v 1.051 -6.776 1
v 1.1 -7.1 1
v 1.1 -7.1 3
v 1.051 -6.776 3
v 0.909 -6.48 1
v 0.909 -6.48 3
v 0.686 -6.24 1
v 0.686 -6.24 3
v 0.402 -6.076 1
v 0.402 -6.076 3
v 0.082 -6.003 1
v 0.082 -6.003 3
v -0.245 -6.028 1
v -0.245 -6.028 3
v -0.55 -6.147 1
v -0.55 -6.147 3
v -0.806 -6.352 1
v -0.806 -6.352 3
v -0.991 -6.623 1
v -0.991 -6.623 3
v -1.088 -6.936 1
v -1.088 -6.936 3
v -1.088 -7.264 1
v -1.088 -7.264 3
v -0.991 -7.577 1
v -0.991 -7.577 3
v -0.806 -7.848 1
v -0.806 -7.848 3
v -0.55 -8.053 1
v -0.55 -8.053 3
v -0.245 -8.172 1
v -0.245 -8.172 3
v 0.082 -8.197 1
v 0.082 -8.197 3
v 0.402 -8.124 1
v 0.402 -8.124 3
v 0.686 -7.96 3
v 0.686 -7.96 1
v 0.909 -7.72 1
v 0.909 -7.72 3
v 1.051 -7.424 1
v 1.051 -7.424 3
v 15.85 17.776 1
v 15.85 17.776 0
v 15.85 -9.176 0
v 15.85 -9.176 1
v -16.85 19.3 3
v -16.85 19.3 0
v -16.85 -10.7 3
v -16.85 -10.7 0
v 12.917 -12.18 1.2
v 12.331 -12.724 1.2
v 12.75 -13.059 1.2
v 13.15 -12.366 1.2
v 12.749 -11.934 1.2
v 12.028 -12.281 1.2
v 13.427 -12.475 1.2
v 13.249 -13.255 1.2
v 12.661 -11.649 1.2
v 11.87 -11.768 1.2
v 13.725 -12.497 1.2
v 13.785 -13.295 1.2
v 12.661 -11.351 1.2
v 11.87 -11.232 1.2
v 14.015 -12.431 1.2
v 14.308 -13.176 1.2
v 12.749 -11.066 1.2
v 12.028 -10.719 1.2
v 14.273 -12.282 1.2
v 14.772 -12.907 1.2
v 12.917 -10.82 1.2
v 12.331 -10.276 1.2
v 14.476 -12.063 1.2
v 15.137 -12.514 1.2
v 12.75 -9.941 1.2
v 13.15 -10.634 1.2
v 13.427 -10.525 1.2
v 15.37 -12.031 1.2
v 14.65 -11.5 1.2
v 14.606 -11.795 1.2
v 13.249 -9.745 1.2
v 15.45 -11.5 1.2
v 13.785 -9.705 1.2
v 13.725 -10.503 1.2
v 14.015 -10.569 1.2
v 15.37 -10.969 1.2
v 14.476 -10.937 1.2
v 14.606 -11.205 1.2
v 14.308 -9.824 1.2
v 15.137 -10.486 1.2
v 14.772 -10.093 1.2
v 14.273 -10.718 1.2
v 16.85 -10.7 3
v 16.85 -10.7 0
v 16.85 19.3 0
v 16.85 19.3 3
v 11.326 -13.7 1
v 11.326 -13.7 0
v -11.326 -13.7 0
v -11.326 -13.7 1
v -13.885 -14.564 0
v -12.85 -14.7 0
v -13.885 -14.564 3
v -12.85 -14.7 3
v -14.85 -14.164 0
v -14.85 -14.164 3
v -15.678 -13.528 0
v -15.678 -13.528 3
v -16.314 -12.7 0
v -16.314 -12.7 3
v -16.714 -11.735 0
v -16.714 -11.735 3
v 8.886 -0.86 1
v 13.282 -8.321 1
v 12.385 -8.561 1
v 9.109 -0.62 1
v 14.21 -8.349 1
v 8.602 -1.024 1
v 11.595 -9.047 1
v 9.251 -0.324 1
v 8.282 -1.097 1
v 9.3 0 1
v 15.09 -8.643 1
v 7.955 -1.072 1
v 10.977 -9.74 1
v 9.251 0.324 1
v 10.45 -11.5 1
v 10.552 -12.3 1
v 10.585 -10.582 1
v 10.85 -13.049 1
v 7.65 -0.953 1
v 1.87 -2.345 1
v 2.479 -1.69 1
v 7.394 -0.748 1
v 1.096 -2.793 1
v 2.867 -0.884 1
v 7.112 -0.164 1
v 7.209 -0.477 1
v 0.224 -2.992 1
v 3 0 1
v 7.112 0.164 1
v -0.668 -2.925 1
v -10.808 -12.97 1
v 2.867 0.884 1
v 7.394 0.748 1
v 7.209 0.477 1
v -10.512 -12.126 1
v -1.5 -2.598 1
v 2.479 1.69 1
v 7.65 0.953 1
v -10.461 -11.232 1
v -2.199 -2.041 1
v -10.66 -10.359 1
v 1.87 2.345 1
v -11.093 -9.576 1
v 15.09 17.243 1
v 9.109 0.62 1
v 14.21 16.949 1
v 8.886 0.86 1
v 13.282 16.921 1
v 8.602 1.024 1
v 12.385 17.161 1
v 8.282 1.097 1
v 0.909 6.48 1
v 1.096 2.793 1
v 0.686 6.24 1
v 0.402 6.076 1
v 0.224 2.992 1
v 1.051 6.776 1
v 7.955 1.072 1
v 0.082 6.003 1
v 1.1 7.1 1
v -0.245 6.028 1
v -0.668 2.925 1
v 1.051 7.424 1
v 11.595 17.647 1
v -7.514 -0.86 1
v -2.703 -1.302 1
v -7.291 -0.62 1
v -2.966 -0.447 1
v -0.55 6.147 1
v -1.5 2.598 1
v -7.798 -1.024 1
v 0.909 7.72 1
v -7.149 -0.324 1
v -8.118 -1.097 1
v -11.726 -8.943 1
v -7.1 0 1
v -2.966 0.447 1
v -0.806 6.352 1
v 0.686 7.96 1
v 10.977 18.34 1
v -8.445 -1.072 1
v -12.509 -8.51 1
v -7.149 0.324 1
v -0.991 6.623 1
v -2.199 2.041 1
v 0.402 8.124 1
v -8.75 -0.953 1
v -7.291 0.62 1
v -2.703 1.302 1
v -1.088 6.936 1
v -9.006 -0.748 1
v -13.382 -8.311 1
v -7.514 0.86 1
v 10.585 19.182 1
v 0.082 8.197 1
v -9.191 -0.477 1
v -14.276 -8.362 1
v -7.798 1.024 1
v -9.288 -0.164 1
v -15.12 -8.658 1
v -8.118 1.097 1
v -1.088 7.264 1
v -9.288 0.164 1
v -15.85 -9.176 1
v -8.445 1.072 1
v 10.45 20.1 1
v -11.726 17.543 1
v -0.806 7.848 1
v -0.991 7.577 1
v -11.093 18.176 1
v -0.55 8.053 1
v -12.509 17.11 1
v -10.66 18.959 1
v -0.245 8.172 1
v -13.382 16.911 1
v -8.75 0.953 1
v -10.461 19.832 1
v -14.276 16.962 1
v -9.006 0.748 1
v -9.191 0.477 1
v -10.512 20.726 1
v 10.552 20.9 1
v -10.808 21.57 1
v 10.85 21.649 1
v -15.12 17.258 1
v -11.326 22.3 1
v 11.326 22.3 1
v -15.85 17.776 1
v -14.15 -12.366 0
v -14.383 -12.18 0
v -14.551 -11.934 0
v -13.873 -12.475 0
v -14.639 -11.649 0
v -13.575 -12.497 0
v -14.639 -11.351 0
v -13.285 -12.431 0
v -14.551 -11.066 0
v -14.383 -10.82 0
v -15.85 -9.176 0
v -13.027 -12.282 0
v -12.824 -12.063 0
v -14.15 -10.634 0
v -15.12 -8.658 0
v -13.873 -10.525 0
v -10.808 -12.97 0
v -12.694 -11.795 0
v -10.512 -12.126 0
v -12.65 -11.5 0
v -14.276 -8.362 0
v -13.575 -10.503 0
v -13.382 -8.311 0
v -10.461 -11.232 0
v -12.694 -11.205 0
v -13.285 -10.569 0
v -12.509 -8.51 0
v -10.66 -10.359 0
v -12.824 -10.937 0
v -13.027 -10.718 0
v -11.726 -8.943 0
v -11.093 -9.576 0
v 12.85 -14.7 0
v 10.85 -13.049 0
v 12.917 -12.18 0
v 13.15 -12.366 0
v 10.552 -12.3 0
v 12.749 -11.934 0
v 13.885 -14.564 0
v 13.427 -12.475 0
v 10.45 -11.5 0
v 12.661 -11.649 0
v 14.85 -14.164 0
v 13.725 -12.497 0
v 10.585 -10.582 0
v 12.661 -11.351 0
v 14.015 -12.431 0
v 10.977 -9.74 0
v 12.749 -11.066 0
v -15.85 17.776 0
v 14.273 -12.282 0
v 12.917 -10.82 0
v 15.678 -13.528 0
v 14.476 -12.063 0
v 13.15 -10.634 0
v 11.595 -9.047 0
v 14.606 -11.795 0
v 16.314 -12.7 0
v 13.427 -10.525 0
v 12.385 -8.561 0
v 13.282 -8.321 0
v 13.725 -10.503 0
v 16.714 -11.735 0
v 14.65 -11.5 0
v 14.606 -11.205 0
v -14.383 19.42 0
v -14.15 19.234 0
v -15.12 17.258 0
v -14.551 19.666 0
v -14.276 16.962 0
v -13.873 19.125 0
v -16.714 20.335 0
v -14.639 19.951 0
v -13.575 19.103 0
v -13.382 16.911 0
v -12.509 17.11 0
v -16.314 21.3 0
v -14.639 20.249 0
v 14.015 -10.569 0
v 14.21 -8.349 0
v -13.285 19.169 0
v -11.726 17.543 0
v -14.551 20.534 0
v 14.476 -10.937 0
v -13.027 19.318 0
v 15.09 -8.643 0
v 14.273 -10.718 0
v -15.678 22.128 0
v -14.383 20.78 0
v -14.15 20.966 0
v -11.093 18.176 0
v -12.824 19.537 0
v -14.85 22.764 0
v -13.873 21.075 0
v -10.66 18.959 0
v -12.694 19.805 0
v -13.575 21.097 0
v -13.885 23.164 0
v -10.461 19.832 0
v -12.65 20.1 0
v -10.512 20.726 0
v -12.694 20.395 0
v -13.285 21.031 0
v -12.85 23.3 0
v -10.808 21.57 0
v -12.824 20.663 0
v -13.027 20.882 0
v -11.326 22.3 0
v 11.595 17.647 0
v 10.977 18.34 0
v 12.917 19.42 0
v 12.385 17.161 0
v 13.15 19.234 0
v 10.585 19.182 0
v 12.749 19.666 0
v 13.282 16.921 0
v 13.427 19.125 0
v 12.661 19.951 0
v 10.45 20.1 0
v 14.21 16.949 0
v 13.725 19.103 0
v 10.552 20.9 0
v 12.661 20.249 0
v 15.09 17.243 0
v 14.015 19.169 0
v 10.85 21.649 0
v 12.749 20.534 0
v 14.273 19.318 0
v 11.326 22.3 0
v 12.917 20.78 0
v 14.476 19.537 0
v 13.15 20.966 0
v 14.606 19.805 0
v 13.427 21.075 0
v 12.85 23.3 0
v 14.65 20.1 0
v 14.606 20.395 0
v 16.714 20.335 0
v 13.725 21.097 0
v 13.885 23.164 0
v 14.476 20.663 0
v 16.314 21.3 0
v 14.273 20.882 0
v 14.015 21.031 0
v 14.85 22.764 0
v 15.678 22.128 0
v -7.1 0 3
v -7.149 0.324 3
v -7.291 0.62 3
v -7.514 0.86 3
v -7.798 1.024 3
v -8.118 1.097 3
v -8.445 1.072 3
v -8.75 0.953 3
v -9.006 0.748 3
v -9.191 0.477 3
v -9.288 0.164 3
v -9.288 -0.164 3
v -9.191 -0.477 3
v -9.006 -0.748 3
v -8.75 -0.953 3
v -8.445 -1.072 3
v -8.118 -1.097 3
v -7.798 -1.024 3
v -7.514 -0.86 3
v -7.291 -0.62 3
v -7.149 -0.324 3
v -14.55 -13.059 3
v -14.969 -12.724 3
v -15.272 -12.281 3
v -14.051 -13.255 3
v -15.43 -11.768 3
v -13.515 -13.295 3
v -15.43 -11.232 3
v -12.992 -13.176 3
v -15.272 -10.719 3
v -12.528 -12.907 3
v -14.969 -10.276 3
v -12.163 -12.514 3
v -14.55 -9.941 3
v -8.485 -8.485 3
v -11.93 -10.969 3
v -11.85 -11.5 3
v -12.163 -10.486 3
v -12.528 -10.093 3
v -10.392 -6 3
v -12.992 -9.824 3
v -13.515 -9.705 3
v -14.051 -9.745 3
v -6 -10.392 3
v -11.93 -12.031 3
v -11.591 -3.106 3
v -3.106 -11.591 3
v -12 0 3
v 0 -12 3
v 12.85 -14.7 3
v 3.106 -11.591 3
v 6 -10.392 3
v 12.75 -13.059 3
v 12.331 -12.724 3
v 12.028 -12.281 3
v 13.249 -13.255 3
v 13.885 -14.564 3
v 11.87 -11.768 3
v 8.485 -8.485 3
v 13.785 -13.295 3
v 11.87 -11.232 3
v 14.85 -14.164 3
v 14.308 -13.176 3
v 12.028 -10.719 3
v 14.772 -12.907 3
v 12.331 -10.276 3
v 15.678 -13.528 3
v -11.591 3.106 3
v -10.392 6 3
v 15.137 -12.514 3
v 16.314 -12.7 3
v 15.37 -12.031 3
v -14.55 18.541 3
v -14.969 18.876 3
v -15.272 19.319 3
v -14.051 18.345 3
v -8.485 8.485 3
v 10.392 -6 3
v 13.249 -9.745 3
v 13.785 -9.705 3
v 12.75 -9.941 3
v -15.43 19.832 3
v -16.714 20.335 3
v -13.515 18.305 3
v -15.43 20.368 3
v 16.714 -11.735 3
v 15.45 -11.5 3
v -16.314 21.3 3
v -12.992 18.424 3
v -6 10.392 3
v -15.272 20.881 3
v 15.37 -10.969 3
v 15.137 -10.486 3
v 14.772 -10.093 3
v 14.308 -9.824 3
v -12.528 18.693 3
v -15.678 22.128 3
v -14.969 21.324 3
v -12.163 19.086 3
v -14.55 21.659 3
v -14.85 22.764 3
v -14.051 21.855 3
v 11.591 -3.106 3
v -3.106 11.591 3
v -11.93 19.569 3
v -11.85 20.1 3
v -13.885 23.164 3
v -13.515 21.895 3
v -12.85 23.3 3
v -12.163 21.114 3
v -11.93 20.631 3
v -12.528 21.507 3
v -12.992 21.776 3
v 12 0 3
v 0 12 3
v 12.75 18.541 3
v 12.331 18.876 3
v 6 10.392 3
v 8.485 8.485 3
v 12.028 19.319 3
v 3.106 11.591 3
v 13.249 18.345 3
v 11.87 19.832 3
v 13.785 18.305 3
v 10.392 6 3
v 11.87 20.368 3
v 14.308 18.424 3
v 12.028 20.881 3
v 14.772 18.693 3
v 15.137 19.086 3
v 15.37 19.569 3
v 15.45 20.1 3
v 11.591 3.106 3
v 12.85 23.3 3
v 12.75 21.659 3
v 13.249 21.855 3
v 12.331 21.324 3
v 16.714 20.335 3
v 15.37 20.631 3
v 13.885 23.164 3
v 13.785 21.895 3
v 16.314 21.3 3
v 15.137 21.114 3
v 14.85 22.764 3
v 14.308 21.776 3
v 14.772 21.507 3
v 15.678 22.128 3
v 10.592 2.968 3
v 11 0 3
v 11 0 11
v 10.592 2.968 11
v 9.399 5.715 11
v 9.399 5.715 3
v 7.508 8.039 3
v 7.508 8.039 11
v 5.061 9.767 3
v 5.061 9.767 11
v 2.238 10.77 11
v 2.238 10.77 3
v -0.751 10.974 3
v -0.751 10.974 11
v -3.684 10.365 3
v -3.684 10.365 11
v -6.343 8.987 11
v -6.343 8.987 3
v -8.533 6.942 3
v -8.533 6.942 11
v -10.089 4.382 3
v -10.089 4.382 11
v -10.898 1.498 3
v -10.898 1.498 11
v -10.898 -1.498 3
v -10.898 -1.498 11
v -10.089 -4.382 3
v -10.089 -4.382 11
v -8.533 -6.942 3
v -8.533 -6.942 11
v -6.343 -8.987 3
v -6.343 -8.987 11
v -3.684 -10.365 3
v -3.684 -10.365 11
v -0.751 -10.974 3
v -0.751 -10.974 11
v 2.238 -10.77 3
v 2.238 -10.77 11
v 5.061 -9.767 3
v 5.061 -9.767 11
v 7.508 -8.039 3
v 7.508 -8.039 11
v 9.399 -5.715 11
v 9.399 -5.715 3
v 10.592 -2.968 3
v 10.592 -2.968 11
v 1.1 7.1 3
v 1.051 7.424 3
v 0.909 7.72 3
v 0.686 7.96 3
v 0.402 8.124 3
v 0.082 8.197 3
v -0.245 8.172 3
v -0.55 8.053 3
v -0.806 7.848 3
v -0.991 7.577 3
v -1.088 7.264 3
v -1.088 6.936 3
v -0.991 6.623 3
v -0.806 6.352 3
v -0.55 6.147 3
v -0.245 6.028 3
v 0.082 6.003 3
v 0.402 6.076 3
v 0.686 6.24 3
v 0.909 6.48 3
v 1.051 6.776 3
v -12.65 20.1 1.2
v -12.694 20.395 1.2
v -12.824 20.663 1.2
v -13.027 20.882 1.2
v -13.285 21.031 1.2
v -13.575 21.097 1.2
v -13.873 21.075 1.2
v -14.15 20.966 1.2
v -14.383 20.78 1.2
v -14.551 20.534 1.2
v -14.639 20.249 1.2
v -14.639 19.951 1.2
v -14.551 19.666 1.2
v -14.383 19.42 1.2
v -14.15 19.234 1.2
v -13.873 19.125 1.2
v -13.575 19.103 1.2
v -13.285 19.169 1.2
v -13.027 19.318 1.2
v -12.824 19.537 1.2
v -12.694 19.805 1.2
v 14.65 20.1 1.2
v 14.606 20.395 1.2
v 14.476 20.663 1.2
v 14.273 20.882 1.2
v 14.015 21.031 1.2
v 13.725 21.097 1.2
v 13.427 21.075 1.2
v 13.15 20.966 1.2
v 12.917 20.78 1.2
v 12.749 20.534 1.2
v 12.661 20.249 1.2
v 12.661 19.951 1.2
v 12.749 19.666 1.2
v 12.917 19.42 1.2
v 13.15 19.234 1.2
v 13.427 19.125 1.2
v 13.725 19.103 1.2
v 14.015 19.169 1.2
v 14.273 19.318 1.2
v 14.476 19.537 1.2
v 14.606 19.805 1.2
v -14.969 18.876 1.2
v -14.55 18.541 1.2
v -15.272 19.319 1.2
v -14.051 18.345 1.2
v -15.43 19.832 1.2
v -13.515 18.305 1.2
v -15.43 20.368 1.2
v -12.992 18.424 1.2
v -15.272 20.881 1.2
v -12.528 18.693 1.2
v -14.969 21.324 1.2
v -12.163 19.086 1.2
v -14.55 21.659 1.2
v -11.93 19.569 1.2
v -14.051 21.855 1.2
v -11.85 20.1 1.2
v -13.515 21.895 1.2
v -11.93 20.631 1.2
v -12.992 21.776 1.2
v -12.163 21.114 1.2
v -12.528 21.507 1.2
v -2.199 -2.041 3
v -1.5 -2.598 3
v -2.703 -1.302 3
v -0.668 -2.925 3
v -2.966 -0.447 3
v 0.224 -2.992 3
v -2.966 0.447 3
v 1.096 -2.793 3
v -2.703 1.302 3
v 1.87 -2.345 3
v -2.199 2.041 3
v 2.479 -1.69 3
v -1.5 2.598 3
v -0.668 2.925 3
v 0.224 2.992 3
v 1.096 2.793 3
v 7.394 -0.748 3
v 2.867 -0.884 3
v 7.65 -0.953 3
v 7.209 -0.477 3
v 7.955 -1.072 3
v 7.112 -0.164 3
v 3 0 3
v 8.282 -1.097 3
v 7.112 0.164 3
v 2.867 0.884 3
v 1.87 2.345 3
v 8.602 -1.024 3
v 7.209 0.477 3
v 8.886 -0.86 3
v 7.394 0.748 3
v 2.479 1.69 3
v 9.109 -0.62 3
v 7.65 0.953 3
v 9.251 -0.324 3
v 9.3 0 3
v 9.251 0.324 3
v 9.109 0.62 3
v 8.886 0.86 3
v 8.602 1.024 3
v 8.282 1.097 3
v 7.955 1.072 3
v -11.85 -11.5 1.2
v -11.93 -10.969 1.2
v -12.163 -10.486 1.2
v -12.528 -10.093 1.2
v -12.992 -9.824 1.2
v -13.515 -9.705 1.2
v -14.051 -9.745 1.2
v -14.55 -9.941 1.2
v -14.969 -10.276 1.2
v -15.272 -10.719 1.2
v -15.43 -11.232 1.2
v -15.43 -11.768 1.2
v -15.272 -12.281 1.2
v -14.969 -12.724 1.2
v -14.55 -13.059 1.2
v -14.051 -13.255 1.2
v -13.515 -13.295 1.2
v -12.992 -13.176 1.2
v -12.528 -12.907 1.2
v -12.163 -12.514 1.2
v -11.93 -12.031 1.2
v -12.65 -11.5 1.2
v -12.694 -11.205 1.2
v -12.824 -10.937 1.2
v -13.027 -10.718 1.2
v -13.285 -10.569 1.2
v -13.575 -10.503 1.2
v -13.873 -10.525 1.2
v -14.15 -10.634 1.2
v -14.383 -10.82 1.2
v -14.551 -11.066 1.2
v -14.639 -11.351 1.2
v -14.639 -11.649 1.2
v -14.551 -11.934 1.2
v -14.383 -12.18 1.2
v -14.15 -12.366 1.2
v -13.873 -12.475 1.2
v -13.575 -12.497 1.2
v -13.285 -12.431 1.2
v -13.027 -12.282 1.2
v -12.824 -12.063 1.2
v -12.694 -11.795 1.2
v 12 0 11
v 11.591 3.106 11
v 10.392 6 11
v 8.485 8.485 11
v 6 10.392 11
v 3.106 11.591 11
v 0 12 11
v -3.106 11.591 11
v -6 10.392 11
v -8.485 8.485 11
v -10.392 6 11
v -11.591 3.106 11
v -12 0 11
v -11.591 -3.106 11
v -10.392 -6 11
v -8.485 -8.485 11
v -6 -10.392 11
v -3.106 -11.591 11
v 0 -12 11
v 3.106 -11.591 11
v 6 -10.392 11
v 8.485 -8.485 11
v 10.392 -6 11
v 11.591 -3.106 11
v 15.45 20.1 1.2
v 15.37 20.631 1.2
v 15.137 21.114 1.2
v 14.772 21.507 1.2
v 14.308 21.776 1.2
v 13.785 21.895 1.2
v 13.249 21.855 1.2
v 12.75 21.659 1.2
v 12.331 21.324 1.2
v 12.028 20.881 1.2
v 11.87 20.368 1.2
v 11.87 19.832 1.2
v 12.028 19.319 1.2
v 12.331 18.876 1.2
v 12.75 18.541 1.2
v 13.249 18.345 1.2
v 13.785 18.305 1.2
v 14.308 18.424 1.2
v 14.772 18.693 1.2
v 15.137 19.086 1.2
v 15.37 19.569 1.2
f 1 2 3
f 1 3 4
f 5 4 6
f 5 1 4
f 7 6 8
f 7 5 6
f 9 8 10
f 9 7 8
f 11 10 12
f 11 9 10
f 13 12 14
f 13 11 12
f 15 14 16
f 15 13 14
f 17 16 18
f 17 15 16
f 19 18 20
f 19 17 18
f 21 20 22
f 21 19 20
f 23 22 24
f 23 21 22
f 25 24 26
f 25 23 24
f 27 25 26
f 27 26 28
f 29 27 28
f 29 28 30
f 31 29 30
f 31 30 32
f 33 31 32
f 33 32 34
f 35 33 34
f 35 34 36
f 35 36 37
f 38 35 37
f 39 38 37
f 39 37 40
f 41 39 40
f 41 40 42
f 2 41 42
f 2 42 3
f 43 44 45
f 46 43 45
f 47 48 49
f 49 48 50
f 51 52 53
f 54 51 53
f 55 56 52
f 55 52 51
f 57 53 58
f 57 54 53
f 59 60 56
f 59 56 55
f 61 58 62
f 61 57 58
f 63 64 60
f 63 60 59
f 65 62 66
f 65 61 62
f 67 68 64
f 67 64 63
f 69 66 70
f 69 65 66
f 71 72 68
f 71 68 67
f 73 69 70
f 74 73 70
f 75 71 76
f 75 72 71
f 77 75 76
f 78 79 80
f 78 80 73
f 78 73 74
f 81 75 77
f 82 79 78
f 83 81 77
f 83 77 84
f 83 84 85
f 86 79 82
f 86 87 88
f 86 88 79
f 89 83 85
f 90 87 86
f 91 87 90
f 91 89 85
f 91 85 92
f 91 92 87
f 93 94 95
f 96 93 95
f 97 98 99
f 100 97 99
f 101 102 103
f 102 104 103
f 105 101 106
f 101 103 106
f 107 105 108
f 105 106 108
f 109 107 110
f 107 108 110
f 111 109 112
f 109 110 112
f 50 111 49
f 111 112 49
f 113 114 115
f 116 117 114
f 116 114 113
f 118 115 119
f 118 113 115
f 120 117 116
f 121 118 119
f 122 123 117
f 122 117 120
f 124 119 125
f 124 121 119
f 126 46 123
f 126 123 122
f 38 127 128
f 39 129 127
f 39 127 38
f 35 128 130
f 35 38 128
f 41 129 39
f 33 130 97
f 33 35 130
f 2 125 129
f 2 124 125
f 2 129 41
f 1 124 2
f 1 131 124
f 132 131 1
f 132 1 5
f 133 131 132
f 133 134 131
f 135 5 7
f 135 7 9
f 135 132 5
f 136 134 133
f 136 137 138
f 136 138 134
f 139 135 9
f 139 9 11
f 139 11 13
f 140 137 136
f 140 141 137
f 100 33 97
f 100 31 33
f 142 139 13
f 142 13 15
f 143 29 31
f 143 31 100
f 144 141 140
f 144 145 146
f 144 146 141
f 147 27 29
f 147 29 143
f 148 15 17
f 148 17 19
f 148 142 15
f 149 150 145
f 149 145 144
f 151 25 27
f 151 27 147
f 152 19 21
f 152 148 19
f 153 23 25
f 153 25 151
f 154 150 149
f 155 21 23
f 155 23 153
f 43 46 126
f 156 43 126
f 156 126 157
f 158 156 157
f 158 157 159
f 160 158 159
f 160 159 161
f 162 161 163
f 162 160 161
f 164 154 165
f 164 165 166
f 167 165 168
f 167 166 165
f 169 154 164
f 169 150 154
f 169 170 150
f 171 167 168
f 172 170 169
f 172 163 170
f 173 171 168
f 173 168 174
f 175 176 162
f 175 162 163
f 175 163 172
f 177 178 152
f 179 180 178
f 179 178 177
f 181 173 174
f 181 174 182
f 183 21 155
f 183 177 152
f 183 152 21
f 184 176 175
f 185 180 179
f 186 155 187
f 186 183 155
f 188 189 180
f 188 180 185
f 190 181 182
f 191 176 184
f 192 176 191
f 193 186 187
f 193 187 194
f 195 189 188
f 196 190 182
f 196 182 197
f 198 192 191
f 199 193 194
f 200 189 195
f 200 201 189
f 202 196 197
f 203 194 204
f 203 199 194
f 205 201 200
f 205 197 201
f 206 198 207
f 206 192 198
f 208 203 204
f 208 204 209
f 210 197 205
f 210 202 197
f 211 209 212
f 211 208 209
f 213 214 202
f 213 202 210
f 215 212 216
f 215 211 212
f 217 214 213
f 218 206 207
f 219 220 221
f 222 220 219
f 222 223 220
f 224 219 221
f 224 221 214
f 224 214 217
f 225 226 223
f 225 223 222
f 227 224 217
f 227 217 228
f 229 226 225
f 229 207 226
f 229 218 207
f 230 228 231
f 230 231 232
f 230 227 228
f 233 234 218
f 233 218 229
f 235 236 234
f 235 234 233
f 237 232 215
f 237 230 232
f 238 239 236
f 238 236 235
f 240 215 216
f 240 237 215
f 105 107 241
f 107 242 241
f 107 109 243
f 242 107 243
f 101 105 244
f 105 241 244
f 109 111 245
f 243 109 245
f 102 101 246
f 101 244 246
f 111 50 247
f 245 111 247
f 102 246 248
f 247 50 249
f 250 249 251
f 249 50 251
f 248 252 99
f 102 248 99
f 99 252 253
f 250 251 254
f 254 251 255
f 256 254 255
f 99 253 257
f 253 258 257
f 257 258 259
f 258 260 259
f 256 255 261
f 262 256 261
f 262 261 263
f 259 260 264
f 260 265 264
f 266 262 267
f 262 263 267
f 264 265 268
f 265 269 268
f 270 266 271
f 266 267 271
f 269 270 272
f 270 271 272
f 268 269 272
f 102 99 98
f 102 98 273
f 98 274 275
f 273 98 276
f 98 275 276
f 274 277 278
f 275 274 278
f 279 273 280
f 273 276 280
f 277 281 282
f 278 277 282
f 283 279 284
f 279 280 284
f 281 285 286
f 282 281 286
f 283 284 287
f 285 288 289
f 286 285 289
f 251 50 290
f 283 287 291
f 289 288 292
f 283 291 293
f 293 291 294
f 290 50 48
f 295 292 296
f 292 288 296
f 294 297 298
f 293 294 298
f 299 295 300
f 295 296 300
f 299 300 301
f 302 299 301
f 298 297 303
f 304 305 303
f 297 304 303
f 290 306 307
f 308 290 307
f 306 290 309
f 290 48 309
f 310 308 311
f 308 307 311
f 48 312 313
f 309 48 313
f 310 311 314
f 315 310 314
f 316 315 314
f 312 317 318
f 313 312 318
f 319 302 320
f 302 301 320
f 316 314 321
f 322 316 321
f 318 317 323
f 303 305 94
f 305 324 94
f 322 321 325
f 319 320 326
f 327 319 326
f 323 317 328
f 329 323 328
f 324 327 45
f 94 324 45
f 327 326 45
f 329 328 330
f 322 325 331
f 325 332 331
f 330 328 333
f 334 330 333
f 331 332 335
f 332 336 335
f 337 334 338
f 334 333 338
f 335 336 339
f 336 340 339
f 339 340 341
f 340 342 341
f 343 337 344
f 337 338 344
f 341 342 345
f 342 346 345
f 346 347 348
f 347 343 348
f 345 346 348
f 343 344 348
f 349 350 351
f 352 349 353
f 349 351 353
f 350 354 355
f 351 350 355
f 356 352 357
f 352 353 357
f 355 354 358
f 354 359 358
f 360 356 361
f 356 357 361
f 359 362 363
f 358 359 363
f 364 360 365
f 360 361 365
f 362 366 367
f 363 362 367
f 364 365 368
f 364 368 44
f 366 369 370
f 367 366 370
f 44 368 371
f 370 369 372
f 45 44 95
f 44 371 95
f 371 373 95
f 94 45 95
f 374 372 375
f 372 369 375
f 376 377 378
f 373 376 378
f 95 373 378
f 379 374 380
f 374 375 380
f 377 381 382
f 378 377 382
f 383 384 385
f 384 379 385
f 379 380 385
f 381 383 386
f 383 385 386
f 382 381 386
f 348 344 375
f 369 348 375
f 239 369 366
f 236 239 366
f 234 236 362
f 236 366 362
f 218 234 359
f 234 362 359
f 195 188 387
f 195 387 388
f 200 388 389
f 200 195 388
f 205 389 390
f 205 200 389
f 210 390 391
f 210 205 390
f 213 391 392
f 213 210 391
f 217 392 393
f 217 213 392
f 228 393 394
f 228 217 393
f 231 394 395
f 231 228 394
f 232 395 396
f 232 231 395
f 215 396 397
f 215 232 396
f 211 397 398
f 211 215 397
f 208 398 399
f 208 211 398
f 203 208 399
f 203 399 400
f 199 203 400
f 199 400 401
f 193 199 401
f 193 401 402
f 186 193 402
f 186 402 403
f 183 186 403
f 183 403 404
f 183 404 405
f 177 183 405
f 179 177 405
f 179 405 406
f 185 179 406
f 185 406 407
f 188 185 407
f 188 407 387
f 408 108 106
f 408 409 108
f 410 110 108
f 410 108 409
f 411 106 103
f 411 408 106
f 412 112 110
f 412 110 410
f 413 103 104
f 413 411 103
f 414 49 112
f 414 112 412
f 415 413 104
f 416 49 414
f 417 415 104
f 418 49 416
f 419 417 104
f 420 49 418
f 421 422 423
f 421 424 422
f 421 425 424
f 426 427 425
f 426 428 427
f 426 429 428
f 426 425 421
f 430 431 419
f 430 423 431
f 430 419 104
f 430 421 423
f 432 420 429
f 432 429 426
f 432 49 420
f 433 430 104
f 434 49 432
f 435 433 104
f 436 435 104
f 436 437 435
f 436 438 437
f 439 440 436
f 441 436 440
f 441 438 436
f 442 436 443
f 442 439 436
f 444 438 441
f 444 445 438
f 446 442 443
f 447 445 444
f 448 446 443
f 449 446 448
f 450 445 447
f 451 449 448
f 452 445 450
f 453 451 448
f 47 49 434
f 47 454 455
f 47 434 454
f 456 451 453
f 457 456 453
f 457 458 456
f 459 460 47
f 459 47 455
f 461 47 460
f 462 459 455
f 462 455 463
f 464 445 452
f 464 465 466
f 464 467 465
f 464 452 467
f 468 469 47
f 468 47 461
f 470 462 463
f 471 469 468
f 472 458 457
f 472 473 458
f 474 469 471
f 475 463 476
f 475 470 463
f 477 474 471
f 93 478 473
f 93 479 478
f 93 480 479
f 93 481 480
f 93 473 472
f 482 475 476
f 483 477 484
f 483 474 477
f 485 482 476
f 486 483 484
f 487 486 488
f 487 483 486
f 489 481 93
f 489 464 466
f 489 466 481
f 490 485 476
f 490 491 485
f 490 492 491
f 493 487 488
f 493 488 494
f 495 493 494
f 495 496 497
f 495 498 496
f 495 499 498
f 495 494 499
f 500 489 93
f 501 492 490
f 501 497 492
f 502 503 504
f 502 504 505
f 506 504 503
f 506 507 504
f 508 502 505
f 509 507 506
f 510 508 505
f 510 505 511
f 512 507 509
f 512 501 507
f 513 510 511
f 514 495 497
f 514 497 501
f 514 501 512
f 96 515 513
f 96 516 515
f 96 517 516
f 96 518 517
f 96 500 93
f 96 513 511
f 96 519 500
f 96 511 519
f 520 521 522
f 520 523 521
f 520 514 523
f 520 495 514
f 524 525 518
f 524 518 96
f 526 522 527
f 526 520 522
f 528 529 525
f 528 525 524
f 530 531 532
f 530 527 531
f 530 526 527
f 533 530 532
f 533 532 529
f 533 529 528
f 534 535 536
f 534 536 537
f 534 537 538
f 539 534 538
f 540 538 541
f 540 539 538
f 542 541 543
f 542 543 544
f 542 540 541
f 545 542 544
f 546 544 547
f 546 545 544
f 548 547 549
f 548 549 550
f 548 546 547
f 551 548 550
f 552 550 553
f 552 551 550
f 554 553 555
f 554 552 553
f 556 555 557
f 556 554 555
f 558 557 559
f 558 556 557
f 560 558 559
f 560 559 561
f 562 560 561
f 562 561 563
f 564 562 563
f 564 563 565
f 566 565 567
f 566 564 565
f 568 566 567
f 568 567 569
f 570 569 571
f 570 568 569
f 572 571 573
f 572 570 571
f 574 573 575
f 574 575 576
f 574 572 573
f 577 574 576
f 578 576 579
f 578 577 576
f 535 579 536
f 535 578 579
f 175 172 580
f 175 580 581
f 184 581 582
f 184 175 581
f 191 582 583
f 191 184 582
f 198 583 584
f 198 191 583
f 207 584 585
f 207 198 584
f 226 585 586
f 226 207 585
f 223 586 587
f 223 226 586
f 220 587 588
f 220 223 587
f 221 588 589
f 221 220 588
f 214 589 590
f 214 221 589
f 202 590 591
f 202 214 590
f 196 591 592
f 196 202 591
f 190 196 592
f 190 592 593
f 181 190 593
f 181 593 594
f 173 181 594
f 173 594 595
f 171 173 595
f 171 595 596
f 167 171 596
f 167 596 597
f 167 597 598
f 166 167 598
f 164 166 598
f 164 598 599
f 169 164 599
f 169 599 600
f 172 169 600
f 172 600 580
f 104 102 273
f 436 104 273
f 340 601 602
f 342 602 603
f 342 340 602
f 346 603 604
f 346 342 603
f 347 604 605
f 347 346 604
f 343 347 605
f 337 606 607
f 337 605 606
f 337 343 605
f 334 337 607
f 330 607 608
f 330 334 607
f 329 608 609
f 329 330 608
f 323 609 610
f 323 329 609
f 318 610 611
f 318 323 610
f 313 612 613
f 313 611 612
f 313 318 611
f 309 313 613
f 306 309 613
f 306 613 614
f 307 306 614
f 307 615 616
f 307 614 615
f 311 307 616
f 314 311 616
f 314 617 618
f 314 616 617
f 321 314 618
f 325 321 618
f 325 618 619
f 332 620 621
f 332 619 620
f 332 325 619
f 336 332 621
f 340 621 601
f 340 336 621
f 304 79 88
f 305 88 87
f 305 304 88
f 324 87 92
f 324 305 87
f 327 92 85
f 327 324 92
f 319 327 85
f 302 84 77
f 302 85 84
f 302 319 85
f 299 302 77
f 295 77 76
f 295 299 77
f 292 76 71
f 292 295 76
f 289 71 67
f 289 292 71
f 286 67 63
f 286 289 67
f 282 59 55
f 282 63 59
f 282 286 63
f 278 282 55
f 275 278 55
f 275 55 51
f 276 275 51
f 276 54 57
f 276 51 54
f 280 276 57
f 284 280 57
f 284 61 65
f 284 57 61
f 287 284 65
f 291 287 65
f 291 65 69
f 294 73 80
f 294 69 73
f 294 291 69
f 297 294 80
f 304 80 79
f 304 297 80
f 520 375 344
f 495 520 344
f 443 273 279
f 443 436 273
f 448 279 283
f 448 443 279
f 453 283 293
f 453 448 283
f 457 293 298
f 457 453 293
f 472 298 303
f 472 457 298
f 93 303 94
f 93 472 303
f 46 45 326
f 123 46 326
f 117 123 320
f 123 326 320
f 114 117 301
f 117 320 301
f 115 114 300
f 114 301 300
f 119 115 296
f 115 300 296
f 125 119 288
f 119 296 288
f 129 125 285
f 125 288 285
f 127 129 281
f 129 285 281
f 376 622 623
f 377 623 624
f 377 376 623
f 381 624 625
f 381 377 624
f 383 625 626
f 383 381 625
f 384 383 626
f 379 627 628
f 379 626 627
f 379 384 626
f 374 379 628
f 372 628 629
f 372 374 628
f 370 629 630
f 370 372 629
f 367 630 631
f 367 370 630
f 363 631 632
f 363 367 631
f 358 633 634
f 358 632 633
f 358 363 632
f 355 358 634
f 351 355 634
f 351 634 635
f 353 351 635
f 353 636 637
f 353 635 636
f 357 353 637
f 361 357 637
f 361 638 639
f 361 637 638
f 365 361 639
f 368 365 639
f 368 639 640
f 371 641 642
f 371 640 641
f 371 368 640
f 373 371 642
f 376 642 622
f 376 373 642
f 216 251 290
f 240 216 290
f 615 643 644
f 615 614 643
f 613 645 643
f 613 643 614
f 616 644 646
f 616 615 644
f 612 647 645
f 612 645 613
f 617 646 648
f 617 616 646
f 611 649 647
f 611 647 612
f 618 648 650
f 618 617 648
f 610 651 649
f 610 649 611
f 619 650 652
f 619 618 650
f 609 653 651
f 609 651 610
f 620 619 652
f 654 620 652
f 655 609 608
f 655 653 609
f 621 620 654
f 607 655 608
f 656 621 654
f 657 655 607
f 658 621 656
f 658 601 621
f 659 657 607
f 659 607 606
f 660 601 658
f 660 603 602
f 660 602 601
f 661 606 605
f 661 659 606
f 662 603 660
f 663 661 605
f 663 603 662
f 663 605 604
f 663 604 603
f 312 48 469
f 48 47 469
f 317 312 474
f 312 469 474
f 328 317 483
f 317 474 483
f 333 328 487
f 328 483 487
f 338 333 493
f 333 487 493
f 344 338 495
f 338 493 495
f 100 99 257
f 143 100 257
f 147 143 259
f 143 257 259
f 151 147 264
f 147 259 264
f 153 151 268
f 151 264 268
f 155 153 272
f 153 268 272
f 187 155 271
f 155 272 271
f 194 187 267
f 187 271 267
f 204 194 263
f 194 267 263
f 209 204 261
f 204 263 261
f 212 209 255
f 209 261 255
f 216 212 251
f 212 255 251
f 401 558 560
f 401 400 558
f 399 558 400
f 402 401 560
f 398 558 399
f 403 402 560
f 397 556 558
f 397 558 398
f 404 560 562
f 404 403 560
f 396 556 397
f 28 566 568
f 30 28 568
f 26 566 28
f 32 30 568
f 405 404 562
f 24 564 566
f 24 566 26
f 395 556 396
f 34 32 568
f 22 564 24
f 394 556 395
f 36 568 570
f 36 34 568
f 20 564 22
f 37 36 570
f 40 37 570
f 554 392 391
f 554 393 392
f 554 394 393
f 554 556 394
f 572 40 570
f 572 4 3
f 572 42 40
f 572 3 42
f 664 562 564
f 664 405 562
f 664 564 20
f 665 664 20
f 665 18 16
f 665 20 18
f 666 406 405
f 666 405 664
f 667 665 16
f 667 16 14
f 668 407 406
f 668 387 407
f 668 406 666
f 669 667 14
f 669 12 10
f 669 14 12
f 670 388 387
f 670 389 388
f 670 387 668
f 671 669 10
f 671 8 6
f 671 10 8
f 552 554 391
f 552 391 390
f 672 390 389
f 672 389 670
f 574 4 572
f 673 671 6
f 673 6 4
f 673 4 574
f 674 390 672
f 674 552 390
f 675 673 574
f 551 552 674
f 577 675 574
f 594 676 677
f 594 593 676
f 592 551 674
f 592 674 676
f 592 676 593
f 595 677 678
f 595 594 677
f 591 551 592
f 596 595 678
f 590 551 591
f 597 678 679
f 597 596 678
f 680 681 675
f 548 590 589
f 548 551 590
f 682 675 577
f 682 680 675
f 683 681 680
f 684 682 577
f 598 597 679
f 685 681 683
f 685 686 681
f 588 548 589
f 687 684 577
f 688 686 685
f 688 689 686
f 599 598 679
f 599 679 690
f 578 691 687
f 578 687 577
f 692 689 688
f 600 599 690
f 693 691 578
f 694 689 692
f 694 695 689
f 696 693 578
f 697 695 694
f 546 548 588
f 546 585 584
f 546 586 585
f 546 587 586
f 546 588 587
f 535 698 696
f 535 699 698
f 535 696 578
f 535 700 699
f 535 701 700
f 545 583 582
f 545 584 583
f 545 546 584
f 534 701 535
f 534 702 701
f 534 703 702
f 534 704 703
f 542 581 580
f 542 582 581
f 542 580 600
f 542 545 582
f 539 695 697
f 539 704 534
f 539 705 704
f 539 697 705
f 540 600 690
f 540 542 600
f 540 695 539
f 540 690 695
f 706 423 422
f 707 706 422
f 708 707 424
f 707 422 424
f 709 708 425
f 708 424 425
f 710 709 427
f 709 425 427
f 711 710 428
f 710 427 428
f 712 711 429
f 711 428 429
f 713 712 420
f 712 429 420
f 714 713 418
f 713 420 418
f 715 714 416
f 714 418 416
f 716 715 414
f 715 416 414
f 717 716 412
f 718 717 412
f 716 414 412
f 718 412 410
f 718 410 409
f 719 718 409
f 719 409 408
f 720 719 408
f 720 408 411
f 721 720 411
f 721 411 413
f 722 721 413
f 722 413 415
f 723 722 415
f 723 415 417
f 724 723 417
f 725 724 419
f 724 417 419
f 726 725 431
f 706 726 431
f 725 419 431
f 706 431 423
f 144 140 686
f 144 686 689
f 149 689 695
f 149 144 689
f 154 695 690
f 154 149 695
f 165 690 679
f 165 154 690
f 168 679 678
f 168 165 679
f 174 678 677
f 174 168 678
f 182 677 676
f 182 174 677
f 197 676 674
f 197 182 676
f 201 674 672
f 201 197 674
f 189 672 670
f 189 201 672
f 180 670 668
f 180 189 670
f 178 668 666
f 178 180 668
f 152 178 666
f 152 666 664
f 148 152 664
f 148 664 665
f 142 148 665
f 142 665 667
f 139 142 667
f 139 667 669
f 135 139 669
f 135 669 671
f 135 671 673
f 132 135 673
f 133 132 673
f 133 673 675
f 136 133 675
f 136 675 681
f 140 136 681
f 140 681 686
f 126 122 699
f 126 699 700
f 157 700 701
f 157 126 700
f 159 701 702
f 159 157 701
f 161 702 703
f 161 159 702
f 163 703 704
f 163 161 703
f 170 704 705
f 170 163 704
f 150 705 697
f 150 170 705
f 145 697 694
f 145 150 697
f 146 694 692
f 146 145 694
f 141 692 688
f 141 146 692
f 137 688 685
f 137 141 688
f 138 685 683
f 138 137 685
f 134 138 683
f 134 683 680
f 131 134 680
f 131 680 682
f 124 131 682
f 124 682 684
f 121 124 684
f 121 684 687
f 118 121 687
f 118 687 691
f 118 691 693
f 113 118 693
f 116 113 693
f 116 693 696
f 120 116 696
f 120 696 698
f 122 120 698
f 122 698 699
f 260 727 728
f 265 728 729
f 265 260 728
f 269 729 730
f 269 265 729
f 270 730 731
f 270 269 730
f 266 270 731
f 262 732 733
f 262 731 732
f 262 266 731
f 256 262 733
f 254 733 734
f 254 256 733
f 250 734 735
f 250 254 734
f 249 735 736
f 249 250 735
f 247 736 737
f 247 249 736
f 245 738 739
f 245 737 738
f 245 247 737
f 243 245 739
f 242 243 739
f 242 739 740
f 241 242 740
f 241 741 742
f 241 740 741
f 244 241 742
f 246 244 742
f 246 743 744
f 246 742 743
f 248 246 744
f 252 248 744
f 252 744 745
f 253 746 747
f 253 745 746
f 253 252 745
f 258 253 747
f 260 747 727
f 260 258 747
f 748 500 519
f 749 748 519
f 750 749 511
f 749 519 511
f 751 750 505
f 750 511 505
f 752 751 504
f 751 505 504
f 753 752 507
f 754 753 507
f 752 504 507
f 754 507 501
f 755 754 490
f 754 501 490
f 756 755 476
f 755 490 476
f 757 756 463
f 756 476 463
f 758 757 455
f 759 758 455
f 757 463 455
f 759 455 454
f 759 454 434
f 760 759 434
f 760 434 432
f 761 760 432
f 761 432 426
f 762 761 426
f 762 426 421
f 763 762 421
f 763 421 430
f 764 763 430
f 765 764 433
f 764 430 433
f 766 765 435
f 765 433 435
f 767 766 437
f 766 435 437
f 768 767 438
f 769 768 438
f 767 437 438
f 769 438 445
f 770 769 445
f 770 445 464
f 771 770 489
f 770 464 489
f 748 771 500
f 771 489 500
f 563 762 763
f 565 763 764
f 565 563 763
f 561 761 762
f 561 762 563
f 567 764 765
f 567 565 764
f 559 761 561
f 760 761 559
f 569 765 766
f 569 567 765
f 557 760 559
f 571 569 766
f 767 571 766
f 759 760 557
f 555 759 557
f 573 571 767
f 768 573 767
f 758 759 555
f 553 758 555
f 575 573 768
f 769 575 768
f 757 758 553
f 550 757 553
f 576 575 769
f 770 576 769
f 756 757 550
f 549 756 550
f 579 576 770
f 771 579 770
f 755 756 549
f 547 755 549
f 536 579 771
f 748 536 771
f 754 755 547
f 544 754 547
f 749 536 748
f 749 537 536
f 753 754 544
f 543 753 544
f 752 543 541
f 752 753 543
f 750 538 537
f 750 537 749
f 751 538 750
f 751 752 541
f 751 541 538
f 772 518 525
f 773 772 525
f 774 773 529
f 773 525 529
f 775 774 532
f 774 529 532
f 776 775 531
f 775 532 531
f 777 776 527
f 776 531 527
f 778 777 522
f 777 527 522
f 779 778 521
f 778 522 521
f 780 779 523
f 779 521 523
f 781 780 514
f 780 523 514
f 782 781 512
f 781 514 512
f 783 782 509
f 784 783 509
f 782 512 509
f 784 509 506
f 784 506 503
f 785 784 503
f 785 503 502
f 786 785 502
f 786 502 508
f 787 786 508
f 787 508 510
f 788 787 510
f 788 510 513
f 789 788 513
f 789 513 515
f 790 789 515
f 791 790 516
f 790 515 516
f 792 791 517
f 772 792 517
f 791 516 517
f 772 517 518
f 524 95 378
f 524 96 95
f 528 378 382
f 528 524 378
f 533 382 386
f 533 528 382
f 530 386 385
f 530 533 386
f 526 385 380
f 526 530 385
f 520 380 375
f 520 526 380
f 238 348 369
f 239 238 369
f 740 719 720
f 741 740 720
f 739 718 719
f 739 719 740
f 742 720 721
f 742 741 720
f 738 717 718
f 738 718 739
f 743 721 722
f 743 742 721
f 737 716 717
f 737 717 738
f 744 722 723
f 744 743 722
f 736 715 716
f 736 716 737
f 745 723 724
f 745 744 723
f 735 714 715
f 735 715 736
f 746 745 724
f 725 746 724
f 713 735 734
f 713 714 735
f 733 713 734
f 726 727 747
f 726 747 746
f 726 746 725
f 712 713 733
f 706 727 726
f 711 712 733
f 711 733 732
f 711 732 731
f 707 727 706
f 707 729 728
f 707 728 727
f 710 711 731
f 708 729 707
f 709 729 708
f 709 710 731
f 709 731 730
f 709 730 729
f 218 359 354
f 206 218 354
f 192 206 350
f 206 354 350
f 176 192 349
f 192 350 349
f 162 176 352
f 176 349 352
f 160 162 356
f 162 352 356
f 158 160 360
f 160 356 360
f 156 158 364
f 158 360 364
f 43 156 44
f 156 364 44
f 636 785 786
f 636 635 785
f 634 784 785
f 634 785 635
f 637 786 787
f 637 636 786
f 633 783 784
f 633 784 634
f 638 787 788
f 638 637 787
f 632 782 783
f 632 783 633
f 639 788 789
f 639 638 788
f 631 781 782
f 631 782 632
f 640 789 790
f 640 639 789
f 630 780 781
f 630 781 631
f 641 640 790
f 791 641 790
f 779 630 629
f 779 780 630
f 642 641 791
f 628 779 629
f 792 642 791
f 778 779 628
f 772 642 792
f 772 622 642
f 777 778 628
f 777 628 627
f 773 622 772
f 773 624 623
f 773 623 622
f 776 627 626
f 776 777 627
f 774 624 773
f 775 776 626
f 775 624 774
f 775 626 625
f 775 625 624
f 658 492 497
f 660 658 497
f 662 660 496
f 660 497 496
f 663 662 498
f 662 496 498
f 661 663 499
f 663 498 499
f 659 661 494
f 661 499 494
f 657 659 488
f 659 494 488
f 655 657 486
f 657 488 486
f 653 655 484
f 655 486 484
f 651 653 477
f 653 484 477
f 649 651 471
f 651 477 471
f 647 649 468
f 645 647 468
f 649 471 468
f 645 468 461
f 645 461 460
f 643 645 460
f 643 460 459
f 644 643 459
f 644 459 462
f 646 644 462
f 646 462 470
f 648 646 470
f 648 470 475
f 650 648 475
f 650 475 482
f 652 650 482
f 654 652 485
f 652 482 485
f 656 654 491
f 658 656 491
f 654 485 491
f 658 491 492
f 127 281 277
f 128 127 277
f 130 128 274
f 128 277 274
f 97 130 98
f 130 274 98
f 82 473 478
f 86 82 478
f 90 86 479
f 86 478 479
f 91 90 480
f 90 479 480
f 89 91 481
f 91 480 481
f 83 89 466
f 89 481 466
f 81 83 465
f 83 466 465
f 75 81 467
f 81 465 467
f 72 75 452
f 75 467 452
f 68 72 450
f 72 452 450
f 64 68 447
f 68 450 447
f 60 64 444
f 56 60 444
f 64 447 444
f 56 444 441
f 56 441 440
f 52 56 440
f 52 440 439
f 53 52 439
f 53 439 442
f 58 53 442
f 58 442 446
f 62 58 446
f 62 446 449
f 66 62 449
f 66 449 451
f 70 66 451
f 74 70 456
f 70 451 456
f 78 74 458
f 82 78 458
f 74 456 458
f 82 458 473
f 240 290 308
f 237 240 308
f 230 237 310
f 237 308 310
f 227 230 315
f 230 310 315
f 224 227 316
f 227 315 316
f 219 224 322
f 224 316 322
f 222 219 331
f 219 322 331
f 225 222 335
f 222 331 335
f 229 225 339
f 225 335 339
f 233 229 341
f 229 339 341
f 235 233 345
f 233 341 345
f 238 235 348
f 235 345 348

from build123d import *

# Parameters (mm, degrees)
SZKIC1_R                    = 3
SZKIC1_R_2                  = 1.1
SZKIC1_R_3                  = 1
DODANIE_WYCI_GNI_CIE1_DEPTH = 3
SZKIC2_R                    = 12
SZKIC2_R_2                  = 11
DODANIE_WYCI_GNI_CIE2_DEPTH = 8
SZKIC3_R                    = 1.1
SZKIC3_R_2                  = 3
WYTNIJ_WYCI_GNI_CIE1_DEPTH  = 1
SZKIC4_R                    = 1.8
WYTNIJ_WYCI_GNI_CIE2_DEPTH  = 1.8
ZAOKR_GLENIE1_R             = 4


with BuildPart() as part:
    # Szkic1 → Dodanie-wyciągnięcie1 (new body)
    with BuildSketch(Plane.XY):
        Polygon((-16.85, 0), (-16.85, -14.7), (0, -14.7), (16.85, -14.7), (16.85, 23.3), (-16.85, 23.3), align=None)
        Circle(SZKIC1_R, mode=Mode.SUBTRACT)
        with Locations((-8.2, 0)):
            Circle(SZKIC1_R_2, mode=Mode.SUBTRACT)
        with Locations((8.2, 0)):
            Circle(SZKIC1_R_2, mode=Mode.SUBTRACT)
        with Locations((0, 7.1)):
            Circle(SZKIC1_R_2, mode=Mode.SUBTRACT)
        with Locations((0, -7.1)):
            Circle(SZKIC1_R_2, mode=Mode.SUBTRACT)
        with Locations((-13.65, 20.1)):
            Circle(SZKIC1_R_3, mode=Mode.SUBTRACT)
        with Locations((13.65, 20.1)):
            Circle(SZKIC1_R_3, mode=Mode.SUBTRACT)
        with Locations((13.65, -11.5)):
            Circle(SZKIC1_R_3, mode=Mode.SUBTRACT)
        with Locations((-13.65, -11.5)):
            Circle(SZKIC1_R_3, mode=Mode.SUBTRACT)
    extrude(amount=DODANIE_WYCI_GNI_CIE1_DEPTH)

    # Szkic2 → Dodanie-wyciągnięcie2 (add)
    with BuildSketch(Plane.XY.offset(3)):
        Circle(SZKIC2_R)
        Circle(SZKIC2_R_2, mode=Mode.SUBTRACT)
    extrude(amount=DODANIE_WYCI_GNI_CIE2_DEPTH)

    # Szkic3 → Wytnij-wyciągnięcie1 (cut)
    with BuildSketch(Plane(origin=(0, 0, 0), x_dir=(-1, 0, 0), z_dir=(0, 0, -1))):
        with BuildLine():
            Line((11.326209992, 22.3), (-11.326209992, 22.3))
            ThreePointArc((-11.326209992, 22.3), (-10.67711184, 21.284033778), (-10.45, 20.1))
            ThreePointArc((-10.45, 20.1), (-12.385088936, 17.160612309), (-15.85, 17.776209992))
            Line((-15.85, 17.776209992), (-15.85, -9.176209992))
            ThreePointArc((-15.85, -9.176209992), (-12.385088936, -8.560612309), (-10.45, -11.5))
            ThreePointArc((-10.45, -11.5), (-10.67711184, -12.684033778), (-11.326209992, -13.7))
            Line((-11.326209992, -13.7), (11.326209992, -13.7))
            ThreePointArc((11.326209992, -13.7), (11.3872583, -9.2372583), (15.85, -9.176209992))
            Line((15.85, -9.176209992), (15.85, 17.776209992))
            ThreePointArc((15.85, 17.776209992), (11.3872583, 17.8372583), (11.326209992, 22.3))
        make_face()
        with Locations((-8.2, 0)):
            Circle(SZKIC3_R, mode=Mode.SUBTRACT)
        with Locations((0, -7.1)):
            Circle(SZKIC3_R, mode=Mode.SUBTRACT)
        Circle(SZKIC3_R_2, mode=Mode.SUBTRACT)
        with Locations((8.2, 0)):
            Circle(SZKIC3_R, mode=Mode.SUBTRACT)
        with Locations((0, 7.1)):
            Circle(SZKIC3_R, mode=Mode.SUBTRACT)
    extrude(amount=-WYTNIJ_WYCI_GNI_CIE1_DEPTH, mode=Mode.SUBTRACT)

    # Szkic4 → Wytnij-wyciągnięcie2 (cut)
    with BuildSketch(Plane.XY.offset(3)):
        with Locations((-13.65, 20.1)):
            Circle(SZKIC4_R)
        with Locations((13.65, 20.1)):
            Circle(SZKIC4_R)
        with Locations((13.65, -11.5)):
            Circle(SZKIC4_R)
        with Locations((-13.65, -11.5)):
            Circle(SZKIC4_R)
    extrude(amount=-WYTNIJ_WYCI_GNI_CIE2_DEPTH, mode=Mode.SUBTRACT)

    # Zaokrąglenie1
    zaokr_glenie1_edges = [part.edges().sort_by_distance(p)[0] for p in [
        (-16.85, 23.3, 1.5),
        (16.85, 23.3, 1.5),
        (16.85, -14.7, 1.5),
        (-16.85, -14.7, 1.5),
    ]]
    fillet(zaokr_glenie1_edges, radius=ZAOKR_GLENIE1_R)


solid = part.part
